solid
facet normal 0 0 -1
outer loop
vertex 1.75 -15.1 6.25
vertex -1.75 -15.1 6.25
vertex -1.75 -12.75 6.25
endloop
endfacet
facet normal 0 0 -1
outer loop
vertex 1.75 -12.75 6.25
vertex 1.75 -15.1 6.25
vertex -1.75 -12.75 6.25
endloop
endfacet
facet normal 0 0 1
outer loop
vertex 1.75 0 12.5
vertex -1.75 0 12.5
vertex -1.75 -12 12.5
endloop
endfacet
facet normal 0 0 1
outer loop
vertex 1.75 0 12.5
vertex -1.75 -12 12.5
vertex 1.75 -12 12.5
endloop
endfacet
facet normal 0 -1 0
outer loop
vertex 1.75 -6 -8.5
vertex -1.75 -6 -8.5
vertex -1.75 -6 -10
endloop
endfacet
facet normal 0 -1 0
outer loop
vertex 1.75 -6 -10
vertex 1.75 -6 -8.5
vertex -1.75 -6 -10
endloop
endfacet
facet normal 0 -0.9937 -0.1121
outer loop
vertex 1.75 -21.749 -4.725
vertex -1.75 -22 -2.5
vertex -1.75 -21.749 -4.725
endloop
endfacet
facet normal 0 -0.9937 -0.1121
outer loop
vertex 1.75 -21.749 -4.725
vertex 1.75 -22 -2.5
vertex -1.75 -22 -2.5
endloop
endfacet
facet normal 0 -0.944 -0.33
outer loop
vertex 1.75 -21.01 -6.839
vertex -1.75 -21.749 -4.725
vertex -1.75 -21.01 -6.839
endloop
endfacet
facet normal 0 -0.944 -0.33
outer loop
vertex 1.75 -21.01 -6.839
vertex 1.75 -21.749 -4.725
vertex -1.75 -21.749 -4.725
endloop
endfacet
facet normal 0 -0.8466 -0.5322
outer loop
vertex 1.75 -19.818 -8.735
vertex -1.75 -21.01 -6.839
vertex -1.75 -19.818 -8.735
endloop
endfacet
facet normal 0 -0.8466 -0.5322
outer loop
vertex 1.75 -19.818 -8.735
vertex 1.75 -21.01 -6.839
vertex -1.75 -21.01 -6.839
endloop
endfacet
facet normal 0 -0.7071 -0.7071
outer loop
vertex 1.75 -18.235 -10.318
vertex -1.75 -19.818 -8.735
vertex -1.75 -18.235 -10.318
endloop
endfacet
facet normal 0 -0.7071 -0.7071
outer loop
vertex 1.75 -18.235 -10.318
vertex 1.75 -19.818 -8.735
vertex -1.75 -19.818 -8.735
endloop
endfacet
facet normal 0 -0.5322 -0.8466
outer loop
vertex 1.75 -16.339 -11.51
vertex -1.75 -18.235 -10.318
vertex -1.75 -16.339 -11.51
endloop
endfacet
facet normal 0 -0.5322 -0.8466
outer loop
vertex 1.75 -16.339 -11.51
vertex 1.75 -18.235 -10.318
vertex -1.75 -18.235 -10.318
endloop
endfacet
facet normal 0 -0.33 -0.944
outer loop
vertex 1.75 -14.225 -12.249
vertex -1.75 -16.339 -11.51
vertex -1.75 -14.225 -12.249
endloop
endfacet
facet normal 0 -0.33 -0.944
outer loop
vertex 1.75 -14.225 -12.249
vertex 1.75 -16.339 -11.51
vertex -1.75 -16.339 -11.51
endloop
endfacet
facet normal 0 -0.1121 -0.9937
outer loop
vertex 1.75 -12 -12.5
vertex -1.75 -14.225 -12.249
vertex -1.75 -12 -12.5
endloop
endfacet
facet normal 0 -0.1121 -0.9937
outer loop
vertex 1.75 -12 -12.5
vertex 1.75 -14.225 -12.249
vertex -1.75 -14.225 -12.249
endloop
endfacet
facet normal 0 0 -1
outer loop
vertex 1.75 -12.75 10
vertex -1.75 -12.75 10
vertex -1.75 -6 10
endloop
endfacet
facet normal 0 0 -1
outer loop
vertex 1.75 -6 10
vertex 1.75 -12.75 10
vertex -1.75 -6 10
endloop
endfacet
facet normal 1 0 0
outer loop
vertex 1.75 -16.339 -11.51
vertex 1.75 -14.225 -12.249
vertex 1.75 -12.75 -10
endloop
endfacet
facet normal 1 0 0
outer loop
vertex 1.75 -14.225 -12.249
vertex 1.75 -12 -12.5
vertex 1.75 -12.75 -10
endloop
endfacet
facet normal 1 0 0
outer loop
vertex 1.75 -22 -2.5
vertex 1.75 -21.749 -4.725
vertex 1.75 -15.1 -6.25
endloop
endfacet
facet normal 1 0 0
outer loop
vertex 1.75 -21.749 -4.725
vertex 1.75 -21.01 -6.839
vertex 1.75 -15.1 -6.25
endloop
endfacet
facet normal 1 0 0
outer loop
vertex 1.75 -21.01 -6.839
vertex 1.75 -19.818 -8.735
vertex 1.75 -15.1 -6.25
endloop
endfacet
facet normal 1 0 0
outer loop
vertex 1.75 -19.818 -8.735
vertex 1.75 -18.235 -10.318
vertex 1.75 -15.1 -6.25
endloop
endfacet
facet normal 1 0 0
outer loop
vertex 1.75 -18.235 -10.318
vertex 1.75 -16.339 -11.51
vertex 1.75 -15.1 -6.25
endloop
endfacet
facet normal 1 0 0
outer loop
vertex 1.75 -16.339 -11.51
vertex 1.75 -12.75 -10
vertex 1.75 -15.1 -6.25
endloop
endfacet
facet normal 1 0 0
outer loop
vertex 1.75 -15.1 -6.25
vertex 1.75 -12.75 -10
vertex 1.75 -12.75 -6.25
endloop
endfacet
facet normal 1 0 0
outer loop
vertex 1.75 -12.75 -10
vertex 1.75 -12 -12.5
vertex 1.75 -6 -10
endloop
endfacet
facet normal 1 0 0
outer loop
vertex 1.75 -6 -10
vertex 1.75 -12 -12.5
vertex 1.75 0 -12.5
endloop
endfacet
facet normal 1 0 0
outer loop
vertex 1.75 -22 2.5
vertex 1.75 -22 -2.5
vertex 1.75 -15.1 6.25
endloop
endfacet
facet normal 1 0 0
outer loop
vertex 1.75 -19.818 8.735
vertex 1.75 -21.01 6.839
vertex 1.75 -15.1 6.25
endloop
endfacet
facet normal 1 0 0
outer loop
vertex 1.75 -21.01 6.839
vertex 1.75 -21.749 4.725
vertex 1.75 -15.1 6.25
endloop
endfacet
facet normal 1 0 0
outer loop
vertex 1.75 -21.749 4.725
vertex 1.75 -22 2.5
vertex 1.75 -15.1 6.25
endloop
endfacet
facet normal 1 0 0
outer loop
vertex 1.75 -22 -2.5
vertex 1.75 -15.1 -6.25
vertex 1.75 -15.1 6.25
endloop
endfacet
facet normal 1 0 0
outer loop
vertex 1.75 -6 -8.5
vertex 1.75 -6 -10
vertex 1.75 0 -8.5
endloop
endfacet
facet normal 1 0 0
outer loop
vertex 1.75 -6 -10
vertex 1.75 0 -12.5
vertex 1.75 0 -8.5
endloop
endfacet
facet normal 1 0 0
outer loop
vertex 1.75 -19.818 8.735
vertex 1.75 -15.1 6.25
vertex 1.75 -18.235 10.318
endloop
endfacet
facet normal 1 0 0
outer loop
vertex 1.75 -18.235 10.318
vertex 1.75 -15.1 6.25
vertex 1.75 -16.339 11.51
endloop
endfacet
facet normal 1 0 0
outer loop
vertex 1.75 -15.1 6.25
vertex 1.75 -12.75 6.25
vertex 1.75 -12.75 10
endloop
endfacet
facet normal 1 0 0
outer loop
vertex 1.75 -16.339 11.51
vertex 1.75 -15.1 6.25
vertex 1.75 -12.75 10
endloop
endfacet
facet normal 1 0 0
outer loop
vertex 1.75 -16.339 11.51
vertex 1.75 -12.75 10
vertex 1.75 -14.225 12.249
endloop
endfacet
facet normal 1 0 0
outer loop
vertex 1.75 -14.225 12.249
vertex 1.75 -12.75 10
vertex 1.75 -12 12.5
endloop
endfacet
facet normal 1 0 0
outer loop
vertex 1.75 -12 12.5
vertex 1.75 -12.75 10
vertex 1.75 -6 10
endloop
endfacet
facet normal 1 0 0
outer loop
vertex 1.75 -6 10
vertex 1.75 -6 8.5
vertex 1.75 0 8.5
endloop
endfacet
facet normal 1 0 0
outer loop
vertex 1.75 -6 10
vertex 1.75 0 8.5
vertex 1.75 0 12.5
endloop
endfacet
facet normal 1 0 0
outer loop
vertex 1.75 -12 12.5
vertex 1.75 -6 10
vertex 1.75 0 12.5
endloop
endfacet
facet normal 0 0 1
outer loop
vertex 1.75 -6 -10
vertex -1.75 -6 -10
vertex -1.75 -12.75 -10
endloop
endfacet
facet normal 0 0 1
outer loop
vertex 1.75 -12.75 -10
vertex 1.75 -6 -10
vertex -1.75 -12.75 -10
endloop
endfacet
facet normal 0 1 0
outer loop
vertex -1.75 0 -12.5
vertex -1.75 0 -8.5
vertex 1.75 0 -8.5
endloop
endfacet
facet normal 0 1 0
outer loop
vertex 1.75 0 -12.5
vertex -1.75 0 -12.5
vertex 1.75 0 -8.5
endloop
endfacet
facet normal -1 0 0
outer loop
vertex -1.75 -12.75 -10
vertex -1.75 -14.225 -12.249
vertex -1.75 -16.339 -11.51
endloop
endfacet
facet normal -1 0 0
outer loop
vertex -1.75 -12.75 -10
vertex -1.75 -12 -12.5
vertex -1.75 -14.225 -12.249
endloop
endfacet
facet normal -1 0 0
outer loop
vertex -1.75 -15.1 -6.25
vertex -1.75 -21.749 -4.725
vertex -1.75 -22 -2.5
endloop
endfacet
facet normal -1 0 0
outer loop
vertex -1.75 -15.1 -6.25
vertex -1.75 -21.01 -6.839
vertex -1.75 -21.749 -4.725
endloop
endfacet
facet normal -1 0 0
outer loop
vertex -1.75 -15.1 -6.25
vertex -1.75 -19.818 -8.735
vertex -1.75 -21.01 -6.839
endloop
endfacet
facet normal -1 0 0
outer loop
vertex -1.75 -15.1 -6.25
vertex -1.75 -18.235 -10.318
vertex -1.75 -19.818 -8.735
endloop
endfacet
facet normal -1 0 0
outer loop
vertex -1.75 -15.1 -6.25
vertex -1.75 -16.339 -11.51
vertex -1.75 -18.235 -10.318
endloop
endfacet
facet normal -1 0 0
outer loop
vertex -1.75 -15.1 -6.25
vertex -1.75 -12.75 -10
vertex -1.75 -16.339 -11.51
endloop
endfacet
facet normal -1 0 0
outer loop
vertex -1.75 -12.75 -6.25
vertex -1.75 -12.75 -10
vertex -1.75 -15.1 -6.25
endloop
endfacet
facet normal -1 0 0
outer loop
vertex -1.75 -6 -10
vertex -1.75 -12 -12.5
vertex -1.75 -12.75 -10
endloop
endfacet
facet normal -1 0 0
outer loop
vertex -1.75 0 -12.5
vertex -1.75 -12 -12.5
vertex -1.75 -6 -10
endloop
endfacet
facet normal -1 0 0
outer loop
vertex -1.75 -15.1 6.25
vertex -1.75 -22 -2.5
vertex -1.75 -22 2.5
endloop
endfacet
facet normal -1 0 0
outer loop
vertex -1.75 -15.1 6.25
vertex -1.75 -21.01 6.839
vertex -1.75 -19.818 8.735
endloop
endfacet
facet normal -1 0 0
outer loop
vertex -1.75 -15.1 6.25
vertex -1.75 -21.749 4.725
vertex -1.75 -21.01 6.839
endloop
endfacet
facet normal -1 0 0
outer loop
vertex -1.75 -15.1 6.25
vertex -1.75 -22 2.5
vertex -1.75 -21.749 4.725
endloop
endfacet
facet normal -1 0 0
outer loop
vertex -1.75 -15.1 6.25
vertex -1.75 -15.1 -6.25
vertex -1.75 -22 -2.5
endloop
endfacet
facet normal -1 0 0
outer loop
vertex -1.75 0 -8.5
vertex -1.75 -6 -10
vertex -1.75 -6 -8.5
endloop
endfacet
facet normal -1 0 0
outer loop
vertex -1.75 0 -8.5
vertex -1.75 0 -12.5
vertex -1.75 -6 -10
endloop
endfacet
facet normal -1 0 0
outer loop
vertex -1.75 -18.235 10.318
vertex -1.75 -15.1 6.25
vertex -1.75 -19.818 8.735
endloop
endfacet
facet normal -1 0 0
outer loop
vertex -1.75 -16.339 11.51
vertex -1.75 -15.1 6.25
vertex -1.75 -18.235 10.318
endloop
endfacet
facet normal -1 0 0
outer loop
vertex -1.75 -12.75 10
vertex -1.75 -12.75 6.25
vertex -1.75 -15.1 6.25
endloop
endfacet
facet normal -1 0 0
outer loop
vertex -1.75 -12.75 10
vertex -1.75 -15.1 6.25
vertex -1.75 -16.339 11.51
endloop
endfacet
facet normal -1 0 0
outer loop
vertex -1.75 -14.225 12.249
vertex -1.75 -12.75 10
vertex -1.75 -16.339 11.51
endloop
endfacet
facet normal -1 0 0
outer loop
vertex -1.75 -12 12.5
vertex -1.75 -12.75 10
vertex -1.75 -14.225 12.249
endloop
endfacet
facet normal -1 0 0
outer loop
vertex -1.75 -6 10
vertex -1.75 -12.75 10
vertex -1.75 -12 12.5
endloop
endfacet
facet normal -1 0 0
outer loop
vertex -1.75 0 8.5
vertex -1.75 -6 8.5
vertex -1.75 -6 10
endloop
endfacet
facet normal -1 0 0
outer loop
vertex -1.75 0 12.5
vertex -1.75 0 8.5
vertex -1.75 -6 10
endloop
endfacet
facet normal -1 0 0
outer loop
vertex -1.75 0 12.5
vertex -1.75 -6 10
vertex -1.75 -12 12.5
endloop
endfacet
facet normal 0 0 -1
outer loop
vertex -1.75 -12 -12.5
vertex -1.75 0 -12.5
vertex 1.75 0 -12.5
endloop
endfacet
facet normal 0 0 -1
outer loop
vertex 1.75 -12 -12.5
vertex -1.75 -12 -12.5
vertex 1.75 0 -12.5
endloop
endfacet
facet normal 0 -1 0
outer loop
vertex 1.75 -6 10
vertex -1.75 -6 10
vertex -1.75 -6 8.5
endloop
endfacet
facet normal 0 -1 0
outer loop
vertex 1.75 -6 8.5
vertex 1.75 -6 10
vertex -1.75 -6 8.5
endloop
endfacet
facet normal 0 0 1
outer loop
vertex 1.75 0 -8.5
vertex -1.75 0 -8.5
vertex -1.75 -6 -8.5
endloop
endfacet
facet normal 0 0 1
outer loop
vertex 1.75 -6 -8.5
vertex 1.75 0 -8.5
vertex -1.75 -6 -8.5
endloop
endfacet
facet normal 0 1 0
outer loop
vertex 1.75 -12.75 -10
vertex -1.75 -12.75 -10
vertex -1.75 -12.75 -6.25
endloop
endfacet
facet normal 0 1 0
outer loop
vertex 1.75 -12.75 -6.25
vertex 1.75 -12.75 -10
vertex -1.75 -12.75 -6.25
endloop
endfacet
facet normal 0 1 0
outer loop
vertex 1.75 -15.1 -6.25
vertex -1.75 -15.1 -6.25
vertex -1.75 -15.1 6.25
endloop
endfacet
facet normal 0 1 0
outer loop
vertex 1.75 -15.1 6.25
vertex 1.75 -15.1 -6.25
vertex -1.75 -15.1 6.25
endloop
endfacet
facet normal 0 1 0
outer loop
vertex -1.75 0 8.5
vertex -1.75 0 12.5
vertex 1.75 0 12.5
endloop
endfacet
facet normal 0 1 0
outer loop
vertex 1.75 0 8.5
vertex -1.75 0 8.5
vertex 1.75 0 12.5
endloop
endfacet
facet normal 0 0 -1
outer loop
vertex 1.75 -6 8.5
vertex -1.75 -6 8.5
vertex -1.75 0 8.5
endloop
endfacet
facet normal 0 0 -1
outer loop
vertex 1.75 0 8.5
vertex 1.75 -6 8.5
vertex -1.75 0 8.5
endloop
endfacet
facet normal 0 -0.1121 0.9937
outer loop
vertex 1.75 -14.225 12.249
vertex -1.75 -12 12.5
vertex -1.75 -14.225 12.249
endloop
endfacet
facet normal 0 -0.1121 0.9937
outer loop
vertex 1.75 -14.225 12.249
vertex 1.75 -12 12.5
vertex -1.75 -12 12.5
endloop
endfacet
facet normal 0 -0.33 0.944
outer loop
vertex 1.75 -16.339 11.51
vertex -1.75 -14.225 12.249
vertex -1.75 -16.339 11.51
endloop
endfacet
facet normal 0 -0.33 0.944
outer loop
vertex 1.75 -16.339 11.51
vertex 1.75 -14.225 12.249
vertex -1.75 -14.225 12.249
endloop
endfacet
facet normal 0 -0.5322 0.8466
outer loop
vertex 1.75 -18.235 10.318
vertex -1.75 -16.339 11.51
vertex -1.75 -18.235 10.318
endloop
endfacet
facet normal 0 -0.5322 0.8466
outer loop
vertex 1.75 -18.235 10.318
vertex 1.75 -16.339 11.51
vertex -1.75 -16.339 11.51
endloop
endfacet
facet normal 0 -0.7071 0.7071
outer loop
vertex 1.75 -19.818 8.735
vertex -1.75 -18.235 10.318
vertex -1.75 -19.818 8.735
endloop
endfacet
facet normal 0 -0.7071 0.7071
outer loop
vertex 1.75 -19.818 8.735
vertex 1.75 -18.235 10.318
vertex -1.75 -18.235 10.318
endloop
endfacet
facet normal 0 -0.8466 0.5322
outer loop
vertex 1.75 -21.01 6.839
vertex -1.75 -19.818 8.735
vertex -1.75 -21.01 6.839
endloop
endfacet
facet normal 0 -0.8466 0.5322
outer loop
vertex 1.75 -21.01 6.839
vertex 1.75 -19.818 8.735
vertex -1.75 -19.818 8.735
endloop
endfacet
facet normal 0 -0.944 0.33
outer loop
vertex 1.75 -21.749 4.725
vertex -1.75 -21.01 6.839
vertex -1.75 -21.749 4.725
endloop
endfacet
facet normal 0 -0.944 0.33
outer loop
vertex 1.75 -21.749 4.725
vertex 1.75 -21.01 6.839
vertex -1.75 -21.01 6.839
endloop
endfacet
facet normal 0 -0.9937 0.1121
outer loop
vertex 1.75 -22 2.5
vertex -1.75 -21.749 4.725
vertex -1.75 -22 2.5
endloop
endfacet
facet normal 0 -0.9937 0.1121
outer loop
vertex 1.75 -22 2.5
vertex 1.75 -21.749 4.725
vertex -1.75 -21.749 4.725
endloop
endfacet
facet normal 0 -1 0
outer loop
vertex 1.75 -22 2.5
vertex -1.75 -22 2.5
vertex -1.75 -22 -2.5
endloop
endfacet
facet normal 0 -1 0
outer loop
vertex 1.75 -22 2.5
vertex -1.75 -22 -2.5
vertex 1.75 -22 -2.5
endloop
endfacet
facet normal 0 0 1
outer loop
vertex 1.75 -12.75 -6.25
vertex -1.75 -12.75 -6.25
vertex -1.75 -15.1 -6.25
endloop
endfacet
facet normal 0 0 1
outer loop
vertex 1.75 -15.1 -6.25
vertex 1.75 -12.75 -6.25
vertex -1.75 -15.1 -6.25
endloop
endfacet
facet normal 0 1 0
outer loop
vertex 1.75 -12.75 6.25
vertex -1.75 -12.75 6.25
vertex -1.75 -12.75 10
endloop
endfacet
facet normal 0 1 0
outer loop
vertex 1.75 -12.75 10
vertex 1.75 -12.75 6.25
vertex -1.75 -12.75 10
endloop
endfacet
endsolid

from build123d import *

# Parameters (mm, degrees)
F0_W     = 3.5
F0_H     = 25
F1_DEPTH = 22
F3_DEPTH = 25
F4_R     = 10


with BuildPart() as f1:
    # F0 (on Front) → F1 (new body)
    with BuildSketch(Plane.XZ):
        Rectangle(F0_W, F0_H)
    extrude(amount=F1_DEPTH)

    # F2 (on face) → F3 (cut)
    with BuildSketch(Plane(origin=(-1.75, 0, 0), x_dir=(0, -1, 0), z_dir=(-1, 0, 0))):
        Polygon((0, 8.5), (0, -8.5), (6, -8.5), (6, -10), (12.75, -10), (12.75, -6.25), (15.1, -6.25), (15.1, 6.25), (12.75, 6.25), (12.75, 10), (6, 10), (6, 8.5), align=None)
    extrude(amount=-F3_DEPTH, mode=Mode.SUBTRACT)

    # F4
    f4_edges = [f1.edges().sort_by_distance(p)[0] for p in [
        (0, -22, 12.5),
        (0, -22, -12.5),
    ]]
    fillet(f4_edges, radius=F4_R)


solid = f1.part
